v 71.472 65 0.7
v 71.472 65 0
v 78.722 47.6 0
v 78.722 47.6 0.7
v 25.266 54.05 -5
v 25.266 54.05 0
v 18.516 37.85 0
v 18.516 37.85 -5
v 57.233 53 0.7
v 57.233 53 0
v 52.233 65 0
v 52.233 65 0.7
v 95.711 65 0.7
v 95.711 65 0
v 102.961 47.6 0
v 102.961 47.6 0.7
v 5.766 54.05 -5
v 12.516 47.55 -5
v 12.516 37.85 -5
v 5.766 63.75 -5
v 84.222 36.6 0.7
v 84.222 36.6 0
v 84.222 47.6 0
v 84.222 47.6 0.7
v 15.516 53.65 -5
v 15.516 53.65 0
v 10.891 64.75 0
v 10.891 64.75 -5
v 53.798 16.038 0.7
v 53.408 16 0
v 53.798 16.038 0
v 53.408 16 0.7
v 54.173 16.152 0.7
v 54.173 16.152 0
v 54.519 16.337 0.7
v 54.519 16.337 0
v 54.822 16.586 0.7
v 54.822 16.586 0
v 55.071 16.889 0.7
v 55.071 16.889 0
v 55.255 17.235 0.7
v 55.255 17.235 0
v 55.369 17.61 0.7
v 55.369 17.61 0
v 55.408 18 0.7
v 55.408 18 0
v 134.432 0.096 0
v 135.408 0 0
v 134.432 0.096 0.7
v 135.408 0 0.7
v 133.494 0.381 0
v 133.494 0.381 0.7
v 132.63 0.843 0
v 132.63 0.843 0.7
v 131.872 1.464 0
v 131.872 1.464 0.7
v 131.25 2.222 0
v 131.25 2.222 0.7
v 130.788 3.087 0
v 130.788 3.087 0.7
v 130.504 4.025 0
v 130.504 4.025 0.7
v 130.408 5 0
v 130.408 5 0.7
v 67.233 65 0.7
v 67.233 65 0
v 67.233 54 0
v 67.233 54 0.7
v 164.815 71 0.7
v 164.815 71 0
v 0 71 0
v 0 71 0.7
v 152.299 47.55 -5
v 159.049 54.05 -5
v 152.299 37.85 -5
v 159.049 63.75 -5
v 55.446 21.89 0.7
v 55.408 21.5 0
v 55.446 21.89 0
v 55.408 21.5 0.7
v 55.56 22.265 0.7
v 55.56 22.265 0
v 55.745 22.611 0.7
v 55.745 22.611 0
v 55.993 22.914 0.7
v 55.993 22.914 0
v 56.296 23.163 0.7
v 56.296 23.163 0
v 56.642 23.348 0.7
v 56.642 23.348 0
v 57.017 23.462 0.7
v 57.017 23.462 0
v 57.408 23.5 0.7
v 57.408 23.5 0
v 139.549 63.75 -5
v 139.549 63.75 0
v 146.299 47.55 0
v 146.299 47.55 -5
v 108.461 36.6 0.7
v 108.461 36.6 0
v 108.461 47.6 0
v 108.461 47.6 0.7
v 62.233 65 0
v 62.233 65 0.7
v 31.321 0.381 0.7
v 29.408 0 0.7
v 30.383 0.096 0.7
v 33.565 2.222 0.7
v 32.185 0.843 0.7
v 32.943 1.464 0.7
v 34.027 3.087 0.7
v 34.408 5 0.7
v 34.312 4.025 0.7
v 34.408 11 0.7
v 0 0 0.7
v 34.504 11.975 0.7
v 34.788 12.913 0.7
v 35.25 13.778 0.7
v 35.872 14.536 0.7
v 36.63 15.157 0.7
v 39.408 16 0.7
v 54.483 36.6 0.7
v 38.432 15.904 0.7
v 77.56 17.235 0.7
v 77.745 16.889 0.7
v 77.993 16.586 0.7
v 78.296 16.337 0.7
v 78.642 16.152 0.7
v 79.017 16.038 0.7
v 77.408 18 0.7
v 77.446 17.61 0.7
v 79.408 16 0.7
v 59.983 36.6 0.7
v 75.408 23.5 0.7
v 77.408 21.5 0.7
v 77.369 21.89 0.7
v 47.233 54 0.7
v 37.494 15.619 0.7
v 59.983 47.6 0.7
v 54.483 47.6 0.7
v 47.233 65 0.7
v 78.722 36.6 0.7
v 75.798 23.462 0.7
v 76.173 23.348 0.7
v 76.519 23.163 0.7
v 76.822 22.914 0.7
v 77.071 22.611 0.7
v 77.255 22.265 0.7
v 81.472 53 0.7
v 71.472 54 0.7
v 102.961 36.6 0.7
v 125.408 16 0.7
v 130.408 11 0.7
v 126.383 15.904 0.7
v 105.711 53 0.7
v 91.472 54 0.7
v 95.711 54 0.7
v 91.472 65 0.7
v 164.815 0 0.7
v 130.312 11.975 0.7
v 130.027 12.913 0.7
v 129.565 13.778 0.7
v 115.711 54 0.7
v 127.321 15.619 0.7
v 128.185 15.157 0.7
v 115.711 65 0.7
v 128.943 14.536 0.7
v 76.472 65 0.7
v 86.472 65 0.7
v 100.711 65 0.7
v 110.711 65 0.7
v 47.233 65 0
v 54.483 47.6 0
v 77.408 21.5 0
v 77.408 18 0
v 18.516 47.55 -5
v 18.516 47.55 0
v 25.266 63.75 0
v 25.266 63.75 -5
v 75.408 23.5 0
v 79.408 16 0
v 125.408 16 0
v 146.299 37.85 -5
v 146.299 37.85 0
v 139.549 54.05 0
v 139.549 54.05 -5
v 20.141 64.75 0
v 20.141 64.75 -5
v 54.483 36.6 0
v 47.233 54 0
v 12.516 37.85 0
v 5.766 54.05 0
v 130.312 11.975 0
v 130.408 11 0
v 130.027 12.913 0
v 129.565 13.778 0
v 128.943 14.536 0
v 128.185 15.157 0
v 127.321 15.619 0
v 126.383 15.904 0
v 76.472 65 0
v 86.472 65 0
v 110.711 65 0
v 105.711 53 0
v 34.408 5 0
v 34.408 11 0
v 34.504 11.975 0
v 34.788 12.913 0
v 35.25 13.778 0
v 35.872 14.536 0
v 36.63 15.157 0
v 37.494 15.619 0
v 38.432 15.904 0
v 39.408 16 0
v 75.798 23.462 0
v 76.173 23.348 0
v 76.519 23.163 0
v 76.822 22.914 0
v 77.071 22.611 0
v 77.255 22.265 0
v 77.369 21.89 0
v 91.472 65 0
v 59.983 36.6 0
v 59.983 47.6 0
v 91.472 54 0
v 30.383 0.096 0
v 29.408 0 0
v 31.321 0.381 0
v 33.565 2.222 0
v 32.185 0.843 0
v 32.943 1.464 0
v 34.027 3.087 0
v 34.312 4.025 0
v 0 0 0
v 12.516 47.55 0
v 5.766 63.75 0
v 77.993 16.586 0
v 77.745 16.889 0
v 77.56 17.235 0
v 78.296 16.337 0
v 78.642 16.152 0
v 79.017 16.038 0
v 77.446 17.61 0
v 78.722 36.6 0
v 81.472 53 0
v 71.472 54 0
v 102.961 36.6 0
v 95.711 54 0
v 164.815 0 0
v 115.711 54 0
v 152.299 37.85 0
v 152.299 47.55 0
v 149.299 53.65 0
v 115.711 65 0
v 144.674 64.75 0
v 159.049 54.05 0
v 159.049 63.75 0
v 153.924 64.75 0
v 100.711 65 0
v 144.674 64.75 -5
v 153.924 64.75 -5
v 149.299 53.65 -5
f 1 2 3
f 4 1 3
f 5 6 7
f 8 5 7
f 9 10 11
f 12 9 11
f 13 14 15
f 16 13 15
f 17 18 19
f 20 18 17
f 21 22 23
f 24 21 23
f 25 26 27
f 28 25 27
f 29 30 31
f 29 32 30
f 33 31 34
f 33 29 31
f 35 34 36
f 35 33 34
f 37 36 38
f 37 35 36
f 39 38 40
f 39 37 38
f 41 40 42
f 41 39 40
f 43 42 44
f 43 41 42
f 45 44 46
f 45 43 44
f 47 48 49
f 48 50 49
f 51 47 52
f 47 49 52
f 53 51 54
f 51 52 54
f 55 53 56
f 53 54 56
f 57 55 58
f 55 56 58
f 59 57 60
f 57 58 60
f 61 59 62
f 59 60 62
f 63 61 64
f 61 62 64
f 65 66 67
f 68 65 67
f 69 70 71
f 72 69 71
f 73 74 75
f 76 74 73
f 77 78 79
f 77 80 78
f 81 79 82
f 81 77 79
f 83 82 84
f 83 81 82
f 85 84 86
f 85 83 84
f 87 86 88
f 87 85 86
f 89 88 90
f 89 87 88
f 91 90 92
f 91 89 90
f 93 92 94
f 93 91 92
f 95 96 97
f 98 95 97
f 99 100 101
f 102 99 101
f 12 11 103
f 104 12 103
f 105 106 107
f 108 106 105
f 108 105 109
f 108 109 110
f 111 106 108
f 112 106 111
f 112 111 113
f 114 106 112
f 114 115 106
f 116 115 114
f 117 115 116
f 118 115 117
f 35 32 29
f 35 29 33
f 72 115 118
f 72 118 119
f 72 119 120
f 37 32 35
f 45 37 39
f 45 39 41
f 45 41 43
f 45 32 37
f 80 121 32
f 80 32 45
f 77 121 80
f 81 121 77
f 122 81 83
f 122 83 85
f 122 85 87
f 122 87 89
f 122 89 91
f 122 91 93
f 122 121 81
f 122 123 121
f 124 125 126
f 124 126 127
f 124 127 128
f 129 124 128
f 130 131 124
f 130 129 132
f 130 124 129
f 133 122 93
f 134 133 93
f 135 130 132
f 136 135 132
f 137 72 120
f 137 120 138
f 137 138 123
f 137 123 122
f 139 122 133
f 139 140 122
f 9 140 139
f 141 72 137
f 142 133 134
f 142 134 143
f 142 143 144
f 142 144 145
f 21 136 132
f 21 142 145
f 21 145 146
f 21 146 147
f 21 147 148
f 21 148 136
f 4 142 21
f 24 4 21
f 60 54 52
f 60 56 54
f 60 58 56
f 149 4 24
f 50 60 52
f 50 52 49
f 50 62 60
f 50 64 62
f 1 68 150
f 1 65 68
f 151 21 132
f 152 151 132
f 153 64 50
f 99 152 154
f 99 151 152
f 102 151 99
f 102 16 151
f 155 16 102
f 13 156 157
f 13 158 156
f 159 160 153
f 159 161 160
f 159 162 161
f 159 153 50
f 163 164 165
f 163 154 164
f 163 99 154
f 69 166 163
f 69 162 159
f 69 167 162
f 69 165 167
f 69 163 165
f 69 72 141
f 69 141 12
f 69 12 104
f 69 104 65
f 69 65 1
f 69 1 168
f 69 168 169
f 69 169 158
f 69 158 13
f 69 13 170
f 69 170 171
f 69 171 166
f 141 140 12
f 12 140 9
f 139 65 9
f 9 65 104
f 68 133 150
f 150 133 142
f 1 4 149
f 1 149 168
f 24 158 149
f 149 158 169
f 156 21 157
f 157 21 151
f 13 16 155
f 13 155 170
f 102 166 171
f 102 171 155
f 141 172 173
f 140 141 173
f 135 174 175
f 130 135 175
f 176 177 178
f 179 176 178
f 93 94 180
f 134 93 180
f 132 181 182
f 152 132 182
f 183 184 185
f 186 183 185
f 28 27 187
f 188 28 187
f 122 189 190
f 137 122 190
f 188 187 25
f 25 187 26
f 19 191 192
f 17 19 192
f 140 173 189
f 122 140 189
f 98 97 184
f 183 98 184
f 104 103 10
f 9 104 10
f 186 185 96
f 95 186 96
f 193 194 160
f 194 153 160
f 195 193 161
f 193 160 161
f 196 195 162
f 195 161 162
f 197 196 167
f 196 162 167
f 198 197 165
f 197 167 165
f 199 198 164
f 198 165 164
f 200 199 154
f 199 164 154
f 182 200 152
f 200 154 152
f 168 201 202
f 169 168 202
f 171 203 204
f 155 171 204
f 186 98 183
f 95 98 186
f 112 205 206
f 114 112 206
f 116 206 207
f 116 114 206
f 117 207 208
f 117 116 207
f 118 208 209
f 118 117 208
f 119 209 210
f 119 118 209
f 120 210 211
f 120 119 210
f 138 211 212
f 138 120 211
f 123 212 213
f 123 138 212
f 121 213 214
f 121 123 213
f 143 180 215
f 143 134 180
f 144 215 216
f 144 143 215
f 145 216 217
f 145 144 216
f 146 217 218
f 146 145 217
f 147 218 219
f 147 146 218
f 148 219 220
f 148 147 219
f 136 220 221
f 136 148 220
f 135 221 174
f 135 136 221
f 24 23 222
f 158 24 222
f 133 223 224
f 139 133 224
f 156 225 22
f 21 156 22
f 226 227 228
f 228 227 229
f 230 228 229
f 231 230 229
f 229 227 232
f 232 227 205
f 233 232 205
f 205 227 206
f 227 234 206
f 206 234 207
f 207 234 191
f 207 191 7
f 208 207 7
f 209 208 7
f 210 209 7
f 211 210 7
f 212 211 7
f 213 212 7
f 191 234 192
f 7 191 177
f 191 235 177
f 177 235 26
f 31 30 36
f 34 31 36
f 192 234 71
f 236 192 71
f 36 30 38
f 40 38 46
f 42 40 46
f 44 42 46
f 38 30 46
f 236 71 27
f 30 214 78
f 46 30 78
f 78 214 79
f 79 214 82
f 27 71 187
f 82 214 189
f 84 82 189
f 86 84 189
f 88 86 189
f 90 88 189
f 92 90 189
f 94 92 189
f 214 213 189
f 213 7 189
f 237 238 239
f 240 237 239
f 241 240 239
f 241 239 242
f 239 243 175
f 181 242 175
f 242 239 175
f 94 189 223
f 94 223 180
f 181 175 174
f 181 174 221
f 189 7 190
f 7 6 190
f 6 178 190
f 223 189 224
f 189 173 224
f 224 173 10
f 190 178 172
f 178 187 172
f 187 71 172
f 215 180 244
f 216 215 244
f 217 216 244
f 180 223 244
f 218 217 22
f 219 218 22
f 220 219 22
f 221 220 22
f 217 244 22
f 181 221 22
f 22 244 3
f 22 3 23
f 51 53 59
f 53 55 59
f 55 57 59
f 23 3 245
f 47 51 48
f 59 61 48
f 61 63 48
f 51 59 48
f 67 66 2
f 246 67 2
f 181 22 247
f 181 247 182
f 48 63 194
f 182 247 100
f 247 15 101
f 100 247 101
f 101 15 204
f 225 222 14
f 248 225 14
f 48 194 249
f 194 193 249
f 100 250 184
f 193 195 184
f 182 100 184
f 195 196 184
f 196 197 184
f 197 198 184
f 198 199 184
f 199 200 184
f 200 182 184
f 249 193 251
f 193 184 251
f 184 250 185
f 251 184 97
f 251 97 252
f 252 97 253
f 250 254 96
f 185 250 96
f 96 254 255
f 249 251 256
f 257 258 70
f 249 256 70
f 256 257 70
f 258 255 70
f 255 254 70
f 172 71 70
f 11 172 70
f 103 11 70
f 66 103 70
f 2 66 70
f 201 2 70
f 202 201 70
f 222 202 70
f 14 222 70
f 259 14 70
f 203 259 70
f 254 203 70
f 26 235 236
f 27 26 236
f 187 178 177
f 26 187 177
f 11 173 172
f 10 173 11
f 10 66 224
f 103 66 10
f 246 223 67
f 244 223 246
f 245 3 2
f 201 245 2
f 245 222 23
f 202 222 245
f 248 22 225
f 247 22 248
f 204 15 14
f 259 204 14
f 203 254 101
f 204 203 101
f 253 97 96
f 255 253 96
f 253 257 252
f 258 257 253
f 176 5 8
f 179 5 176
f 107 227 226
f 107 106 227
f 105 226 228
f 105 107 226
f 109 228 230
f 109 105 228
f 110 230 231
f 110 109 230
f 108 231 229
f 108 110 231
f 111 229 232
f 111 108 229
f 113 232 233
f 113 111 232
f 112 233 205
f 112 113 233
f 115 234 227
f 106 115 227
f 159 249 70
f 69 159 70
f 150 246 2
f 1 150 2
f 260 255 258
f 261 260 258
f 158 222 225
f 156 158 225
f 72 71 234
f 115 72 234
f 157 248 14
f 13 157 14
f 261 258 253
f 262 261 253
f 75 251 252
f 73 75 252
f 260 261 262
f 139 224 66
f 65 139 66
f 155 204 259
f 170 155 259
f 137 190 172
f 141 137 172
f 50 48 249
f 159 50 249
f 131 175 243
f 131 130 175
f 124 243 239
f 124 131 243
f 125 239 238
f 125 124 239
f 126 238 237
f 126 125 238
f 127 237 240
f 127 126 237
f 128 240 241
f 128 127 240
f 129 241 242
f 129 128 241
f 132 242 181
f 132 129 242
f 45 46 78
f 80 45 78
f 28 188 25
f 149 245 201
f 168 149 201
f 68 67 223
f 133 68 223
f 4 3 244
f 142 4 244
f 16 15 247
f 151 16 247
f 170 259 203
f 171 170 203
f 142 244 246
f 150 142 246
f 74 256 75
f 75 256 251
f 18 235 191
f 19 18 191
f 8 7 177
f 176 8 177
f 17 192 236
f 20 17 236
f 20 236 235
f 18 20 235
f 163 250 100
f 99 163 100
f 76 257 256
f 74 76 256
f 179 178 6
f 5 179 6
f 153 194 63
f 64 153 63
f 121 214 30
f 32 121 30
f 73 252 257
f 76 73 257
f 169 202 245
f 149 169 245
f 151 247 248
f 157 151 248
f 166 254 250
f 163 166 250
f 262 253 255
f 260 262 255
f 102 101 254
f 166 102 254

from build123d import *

# Parameters (mm, degrees)
BOSS_EXTRUDE1_DEPTH = 0.7
BOSS_EXTRUDE2_DEPTH = 5
FILLET1_R           = 5
FILLET2_R           = 2


with BuildPart() as part:
    # Sketch1 → Boss-Extrude1 (new body)
    with BuildSketch(Plane.XY):
        Polygon((0, 71), (0, 0), (34.4076055, 0), (34.4076055, 16), (55.4076055, 16), (55.4076055, 23.5), (77.4076055, 23.5), (77.4076055, 16), (130.4076055, 16), (130.4076055, 0), (164.815211, 0), (164.815211, 71), align=None)
        Polygon((47.233378, 65), (54.483378, 47.6), (54.483378, 36.6), (47.233378, 54), align=None, mode=Mode.SUBTRACT)
        Polygon((67.233378, 65), (67.233378, 54), (59.983378, 36.6), (59.983378, 47.6), align=None, mode=Mode.SUBTRACT)
        Polygon((71.472387, 65), (78.722387, 47.6), (78.722387, 36.6), (71.472387, 54), align=None, mode=Mode.SUBTRACT)
        Polygon((57.233378, 53), (52.233378, 65), (62.233378, 65), align=None, mode=Mode.SUBTRACT)
        Polygon((81.472387, 53), (76.472387, 65), (86.472387, 65), align=None, mode=Mode.SUBTRACT)
        Polygon((91.472387, 65), (91.472387, 54), (84.222387, 36.6), (84.222387, 47.6), align=None, mode=Mode.SUBTRACT)
        Polygon((95.711396, 65), (102.961396, 47.6), (102.961396, 36.6), (95.711396, 54), align=None, mode=Mode.SUBTRACT)
        Polygon((115.711396, 65), (115.711396, 54), (108.461396, 36.6), (108.461396, 47.6), align=None, mode=Mode.SUBTRACT)
        Polygon((105.711396, 53), (100.711396, 65), (110.711396, 65), align=None, mode=Mode.SUBTRACT)
    extrude(amount=BOSS_EXTRUDE1_DEPTH)

    # Sketch1<4> → Boss-Extrude2 (add)
    with BuildSketch(Plane.XY):
        Polygon((10.891348, 64.75), (15.516348, 53.65), (20.141348, 64.75), align=None)
        Polygon((5.766348, 63.75), (5.766348, 54.05), (12.516348, 37.85), (12.516348, 47.55), align=None)
        Polygon((25.266348, 63.75), (18.516348, 47.55), (18.516348, 37.85), (25.266348, 54.05), align=None)
        Polygon((144.673863, 64.75), (149.298863, 53.65), (153.923863, 64.75), align=None)
        Polygon((139.548863, 54.05), (146.298863, 37.85), (146.298863, 47.55), (139.548863, 63.75), align=None)
        Polygon((159.048863, 54.05), (159.048863, 63.75), (152.298863, 47.55), (152.298863, 37.85), align=None)
    extrude(amount=-BOSS_EXTRUDE2_DEPTH)

    # Fillet1
    fillet1_edges = [part.edges().sort_by_distance(p)[0] for p in [
        (130.4076055, 16, 0.35),
        (130.4076055, 0, 0.35),
        (34.4076055, 0, 0.35),
        (34.4076055, 16, 0.35),
    ]]
    fillet(fillet1_edges, radius=FILLET1_R)

    # Fillet2
    fillet2_edges = [part.edges().sort_by_distance(p)[0] for p in [
        (77.4076055, 16, 0.35),
        (77.4076055, 23.5, 0.35),
        (55.4076055, 16, 0.35),
        (55.4076055, 23.5, 0.35),
    ]]
    fillet(fillet2_edges, radius=FILLET2_R)


solid = part.part
